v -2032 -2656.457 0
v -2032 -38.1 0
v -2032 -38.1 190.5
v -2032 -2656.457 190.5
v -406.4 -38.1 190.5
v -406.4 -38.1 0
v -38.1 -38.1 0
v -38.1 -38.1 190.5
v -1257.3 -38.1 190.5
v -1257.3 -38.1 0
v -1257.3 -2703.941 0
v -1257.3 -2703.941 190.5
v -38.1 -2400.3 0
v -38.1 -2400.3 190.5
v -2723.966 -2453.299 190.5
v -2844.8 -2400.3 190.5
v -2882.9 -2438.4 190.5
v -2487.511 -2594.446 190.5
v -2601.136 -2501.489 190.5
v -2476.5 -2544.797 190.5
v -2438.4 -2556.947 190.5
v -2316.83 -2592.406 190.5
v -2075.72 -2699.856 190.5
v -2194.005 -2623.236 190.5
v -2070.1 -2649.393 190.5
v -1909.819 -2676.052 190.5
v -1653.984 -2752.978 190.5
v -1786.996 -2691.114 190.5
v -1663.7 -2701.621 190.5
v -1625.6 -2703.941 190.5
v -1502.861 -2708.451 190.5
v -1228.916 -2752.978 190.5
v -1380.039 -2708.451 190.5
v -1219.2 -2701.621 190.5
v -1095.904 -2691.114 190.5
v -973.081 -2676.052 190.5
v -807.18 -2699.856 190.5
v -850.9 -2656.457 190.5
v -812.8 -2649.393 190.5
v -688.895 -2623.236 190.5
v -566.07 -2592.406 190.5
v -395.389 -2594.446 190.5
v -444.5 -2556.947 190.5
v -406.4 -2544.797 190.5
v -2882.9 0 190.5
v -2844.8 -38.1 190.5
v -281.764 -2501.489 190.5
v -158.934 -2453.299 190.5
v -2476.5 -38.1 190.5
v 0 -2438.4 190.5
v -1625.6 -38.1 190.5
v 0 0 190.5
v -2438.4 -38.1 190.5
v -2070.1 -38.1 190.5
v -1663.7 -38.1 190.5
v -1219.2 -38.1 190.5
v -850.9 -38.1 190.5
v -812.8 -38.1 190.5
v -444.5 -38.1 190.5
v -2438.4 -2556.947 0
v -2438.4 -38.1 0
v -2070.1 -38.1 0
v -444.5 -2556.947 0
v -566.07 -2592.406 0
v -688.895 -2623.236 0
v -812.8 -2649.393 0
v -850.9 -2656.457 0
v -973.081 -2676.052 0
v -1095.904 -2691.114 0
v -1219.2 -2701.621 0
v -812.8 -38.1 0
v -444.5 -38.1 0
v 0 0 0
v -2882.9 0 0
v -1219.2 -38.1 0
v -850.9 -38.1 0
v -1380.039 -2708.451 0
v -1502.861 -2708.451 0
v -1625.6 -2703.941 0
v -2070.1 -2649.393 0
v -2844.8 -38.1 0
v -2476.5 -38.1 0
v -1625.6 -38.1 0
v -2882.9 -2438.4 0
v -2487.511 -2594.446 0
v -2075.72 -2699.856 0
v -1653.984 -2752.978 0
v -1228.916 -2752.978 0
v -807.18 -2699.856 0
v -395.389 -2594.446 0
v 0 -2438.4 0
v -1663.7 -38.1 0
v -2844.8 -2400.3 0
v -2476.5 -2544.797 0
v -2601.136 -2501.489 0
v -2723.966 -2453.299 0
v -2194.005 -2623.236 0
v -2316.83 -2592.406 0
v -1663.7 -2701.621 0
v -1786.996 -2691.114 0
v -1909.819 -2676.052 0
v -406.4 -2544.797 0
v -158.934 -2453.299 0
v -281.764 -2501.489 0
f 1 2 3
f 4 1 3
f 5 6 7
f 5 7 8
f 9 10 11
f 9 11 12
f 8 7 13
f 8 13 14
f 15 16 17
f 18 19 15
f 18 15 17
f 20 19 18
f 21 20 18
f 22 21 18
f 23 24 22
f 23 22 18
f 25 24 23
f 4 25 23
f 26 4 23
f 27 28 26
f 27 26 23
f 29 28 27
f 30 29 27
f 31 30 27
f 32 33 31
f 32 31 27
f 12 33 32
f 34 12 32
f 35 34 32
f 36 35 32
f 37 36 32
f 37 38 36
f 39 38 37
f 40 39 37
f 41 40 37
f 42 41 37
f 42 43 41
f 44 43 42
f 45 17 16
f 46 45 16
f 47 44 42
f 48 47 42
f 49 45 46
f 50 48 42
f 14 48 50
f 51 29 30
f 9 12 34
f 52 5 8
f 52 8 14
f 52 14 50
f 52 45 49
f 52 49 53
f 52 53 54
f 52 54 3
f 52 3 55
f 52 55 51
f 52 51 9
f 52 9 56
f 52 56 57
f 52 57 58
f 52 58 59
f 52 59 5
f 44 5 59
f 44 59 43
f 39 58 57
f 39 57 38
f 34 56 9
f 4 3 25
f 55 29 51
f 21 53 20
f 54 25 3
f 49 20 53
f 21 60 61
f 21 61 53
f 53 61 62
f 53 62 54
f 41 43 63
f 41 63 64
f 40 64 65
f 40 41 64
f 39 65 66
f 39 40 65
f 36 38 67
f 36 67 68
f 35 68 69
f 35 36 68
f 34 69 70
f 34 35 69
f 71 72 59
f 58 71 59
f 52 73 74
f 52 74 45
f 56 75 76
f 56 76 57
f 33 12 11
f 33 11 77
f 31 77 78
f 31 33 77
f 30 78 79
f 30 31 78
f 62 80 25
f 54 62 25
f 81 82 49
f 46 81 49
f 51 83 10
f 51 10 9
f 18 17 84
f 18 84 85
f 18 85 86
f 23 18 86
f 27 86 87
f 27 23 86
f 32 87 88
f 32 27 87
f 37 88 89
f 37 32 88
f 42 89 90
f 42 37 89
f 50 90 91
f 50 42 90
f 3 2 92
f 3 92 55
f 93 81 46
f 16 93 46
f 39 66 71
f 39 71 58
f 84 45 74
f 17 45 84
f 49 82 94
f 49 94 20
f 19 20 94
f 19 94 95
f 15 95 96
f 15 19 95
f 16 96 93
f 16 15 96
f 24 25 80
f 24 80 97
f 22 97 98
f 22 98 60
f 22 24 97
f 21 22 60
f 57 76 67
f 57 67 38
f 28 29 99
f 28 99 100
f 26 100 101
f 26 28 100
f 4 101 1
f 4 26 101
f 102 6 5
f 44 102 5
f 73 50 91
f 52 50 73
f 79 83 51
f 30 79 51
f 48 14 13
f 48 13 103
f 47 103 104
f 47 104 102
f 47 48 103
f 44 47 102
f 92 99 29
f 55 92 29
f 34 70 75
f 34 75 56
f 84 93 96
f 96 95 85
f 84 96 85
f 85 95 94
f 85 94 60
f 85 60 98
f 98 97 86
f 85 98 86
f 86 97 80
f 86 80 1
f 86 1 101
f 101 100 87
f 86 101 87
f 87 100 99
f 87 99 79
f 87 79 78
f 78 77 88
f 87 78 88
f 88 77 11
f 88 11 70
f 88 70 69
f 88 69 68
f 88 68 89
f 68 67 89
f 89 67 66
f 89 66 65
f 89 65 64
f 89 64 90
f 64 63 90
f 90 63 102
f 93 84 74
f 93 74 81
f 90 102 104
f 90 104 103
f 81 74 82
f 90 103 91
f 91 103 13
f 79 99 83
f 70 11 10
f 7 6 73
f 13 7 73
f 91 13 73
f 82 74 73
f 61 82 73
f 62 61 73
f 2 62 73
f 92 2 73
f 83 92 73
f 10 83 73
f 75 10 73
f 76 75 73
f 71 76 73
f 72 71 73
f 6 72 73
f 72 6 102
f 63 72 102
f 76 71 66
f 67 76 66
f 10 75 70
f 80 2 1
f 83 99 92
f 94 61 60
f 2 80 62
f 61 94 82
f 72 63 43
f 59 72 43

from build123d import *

# Parameters (mm, degrees)
F0_W     = 38.1
F0_H     = 190.5
F1_DEPTH = 2882.9
F2_W     = 38.1
F2_H     = 190.5
F3_DEPTH = 2362.2
F4_W     = 38.1
F4_H     = 190.5
F5_DEPTH = 2362.2
F7_DEPTH = 190.5
F9_W     = 38.1
F9_H     = 190.5


with BuildPart() as f1:
    # F0 (on Right) → F1 (new body)
    with BuildSketch(Plane.YZ):
        with Locations((-19.05, 95.25)):
            Rectangle(F0_W, F0_H)
    extrude(amount=-F1_DEPTH)

    # F2 (on face) → F3 (join)
    with BuildSketch(Plane.XZ.offset(38.1)):
        with Locations((-19.05, 95.25)):
            Rectangle(F2_W, F2_H)
    extrude(amount=F3_DEPTH)

    # F4 (on face) → F5 (join, through all)
    with BuildSketch(Plane.XZ.offset(38.1)):
        with Locations((-2863.85, 95.25)):
            Rectangle(F4_W, F4_H)
    extrude(amount=F5_DEPTH)


with BuildPart() as f7:
    # F6 (on face) → F7 (new body, through all)
    with BuildSketch(Plane.XY.offset(190.5)):
        with BuildLine():
            Line((-2844.8, -2400.3), (-2882.9, -2400.3))
            Line((-2882.9, -2400.3), (-2882.9, -2438.4))
            ThreePointArc((-2882.9, -2438.4), (-1441.45, -2759.6377807507), (0, -2438.4))
            Line((0, -2438.4), (0, -2400.3))
            Line((0, -2400.3), (-38.1, -2400.3))
            ThreePointArc((-38.1, -2400.3), (-1441.45, -2709.0151483658), (-2844.8, -2400.3))
        make_face()
    extrude(amount=-F7_DEPTH)


with BuildPart() as f1_1:
    add(f1.part)

    # F8: union F7
    add(f7.part)

    # F9 (on face) → F10 (join, up to the next surface of F1)
    with BuildSketch(Plane.XZ.offset(38.1)):
        with Locations((-425.45, 95.25)):
            Rectangle(F9_W, F9_H)
        with Locations((-831.85, 95.25)):
            Rectangle(F9_W, F9_H)
        with Locations((-1238.25, 95.25)):
            Rectangle(F9_W, F9_H)
        with Locations((-1644.65, 95.25)):
            Rectangle(F9_W, F9_H)
        with Locations((-2051.05, 95.25)):
            Rectangle(F9_W, F9_H)
        with Locations((-2457.45, 95.25)):
            Rectangle(F9_W, F9_H)
    extrude(until=Until.NEXT)


solid = f1_1.part
